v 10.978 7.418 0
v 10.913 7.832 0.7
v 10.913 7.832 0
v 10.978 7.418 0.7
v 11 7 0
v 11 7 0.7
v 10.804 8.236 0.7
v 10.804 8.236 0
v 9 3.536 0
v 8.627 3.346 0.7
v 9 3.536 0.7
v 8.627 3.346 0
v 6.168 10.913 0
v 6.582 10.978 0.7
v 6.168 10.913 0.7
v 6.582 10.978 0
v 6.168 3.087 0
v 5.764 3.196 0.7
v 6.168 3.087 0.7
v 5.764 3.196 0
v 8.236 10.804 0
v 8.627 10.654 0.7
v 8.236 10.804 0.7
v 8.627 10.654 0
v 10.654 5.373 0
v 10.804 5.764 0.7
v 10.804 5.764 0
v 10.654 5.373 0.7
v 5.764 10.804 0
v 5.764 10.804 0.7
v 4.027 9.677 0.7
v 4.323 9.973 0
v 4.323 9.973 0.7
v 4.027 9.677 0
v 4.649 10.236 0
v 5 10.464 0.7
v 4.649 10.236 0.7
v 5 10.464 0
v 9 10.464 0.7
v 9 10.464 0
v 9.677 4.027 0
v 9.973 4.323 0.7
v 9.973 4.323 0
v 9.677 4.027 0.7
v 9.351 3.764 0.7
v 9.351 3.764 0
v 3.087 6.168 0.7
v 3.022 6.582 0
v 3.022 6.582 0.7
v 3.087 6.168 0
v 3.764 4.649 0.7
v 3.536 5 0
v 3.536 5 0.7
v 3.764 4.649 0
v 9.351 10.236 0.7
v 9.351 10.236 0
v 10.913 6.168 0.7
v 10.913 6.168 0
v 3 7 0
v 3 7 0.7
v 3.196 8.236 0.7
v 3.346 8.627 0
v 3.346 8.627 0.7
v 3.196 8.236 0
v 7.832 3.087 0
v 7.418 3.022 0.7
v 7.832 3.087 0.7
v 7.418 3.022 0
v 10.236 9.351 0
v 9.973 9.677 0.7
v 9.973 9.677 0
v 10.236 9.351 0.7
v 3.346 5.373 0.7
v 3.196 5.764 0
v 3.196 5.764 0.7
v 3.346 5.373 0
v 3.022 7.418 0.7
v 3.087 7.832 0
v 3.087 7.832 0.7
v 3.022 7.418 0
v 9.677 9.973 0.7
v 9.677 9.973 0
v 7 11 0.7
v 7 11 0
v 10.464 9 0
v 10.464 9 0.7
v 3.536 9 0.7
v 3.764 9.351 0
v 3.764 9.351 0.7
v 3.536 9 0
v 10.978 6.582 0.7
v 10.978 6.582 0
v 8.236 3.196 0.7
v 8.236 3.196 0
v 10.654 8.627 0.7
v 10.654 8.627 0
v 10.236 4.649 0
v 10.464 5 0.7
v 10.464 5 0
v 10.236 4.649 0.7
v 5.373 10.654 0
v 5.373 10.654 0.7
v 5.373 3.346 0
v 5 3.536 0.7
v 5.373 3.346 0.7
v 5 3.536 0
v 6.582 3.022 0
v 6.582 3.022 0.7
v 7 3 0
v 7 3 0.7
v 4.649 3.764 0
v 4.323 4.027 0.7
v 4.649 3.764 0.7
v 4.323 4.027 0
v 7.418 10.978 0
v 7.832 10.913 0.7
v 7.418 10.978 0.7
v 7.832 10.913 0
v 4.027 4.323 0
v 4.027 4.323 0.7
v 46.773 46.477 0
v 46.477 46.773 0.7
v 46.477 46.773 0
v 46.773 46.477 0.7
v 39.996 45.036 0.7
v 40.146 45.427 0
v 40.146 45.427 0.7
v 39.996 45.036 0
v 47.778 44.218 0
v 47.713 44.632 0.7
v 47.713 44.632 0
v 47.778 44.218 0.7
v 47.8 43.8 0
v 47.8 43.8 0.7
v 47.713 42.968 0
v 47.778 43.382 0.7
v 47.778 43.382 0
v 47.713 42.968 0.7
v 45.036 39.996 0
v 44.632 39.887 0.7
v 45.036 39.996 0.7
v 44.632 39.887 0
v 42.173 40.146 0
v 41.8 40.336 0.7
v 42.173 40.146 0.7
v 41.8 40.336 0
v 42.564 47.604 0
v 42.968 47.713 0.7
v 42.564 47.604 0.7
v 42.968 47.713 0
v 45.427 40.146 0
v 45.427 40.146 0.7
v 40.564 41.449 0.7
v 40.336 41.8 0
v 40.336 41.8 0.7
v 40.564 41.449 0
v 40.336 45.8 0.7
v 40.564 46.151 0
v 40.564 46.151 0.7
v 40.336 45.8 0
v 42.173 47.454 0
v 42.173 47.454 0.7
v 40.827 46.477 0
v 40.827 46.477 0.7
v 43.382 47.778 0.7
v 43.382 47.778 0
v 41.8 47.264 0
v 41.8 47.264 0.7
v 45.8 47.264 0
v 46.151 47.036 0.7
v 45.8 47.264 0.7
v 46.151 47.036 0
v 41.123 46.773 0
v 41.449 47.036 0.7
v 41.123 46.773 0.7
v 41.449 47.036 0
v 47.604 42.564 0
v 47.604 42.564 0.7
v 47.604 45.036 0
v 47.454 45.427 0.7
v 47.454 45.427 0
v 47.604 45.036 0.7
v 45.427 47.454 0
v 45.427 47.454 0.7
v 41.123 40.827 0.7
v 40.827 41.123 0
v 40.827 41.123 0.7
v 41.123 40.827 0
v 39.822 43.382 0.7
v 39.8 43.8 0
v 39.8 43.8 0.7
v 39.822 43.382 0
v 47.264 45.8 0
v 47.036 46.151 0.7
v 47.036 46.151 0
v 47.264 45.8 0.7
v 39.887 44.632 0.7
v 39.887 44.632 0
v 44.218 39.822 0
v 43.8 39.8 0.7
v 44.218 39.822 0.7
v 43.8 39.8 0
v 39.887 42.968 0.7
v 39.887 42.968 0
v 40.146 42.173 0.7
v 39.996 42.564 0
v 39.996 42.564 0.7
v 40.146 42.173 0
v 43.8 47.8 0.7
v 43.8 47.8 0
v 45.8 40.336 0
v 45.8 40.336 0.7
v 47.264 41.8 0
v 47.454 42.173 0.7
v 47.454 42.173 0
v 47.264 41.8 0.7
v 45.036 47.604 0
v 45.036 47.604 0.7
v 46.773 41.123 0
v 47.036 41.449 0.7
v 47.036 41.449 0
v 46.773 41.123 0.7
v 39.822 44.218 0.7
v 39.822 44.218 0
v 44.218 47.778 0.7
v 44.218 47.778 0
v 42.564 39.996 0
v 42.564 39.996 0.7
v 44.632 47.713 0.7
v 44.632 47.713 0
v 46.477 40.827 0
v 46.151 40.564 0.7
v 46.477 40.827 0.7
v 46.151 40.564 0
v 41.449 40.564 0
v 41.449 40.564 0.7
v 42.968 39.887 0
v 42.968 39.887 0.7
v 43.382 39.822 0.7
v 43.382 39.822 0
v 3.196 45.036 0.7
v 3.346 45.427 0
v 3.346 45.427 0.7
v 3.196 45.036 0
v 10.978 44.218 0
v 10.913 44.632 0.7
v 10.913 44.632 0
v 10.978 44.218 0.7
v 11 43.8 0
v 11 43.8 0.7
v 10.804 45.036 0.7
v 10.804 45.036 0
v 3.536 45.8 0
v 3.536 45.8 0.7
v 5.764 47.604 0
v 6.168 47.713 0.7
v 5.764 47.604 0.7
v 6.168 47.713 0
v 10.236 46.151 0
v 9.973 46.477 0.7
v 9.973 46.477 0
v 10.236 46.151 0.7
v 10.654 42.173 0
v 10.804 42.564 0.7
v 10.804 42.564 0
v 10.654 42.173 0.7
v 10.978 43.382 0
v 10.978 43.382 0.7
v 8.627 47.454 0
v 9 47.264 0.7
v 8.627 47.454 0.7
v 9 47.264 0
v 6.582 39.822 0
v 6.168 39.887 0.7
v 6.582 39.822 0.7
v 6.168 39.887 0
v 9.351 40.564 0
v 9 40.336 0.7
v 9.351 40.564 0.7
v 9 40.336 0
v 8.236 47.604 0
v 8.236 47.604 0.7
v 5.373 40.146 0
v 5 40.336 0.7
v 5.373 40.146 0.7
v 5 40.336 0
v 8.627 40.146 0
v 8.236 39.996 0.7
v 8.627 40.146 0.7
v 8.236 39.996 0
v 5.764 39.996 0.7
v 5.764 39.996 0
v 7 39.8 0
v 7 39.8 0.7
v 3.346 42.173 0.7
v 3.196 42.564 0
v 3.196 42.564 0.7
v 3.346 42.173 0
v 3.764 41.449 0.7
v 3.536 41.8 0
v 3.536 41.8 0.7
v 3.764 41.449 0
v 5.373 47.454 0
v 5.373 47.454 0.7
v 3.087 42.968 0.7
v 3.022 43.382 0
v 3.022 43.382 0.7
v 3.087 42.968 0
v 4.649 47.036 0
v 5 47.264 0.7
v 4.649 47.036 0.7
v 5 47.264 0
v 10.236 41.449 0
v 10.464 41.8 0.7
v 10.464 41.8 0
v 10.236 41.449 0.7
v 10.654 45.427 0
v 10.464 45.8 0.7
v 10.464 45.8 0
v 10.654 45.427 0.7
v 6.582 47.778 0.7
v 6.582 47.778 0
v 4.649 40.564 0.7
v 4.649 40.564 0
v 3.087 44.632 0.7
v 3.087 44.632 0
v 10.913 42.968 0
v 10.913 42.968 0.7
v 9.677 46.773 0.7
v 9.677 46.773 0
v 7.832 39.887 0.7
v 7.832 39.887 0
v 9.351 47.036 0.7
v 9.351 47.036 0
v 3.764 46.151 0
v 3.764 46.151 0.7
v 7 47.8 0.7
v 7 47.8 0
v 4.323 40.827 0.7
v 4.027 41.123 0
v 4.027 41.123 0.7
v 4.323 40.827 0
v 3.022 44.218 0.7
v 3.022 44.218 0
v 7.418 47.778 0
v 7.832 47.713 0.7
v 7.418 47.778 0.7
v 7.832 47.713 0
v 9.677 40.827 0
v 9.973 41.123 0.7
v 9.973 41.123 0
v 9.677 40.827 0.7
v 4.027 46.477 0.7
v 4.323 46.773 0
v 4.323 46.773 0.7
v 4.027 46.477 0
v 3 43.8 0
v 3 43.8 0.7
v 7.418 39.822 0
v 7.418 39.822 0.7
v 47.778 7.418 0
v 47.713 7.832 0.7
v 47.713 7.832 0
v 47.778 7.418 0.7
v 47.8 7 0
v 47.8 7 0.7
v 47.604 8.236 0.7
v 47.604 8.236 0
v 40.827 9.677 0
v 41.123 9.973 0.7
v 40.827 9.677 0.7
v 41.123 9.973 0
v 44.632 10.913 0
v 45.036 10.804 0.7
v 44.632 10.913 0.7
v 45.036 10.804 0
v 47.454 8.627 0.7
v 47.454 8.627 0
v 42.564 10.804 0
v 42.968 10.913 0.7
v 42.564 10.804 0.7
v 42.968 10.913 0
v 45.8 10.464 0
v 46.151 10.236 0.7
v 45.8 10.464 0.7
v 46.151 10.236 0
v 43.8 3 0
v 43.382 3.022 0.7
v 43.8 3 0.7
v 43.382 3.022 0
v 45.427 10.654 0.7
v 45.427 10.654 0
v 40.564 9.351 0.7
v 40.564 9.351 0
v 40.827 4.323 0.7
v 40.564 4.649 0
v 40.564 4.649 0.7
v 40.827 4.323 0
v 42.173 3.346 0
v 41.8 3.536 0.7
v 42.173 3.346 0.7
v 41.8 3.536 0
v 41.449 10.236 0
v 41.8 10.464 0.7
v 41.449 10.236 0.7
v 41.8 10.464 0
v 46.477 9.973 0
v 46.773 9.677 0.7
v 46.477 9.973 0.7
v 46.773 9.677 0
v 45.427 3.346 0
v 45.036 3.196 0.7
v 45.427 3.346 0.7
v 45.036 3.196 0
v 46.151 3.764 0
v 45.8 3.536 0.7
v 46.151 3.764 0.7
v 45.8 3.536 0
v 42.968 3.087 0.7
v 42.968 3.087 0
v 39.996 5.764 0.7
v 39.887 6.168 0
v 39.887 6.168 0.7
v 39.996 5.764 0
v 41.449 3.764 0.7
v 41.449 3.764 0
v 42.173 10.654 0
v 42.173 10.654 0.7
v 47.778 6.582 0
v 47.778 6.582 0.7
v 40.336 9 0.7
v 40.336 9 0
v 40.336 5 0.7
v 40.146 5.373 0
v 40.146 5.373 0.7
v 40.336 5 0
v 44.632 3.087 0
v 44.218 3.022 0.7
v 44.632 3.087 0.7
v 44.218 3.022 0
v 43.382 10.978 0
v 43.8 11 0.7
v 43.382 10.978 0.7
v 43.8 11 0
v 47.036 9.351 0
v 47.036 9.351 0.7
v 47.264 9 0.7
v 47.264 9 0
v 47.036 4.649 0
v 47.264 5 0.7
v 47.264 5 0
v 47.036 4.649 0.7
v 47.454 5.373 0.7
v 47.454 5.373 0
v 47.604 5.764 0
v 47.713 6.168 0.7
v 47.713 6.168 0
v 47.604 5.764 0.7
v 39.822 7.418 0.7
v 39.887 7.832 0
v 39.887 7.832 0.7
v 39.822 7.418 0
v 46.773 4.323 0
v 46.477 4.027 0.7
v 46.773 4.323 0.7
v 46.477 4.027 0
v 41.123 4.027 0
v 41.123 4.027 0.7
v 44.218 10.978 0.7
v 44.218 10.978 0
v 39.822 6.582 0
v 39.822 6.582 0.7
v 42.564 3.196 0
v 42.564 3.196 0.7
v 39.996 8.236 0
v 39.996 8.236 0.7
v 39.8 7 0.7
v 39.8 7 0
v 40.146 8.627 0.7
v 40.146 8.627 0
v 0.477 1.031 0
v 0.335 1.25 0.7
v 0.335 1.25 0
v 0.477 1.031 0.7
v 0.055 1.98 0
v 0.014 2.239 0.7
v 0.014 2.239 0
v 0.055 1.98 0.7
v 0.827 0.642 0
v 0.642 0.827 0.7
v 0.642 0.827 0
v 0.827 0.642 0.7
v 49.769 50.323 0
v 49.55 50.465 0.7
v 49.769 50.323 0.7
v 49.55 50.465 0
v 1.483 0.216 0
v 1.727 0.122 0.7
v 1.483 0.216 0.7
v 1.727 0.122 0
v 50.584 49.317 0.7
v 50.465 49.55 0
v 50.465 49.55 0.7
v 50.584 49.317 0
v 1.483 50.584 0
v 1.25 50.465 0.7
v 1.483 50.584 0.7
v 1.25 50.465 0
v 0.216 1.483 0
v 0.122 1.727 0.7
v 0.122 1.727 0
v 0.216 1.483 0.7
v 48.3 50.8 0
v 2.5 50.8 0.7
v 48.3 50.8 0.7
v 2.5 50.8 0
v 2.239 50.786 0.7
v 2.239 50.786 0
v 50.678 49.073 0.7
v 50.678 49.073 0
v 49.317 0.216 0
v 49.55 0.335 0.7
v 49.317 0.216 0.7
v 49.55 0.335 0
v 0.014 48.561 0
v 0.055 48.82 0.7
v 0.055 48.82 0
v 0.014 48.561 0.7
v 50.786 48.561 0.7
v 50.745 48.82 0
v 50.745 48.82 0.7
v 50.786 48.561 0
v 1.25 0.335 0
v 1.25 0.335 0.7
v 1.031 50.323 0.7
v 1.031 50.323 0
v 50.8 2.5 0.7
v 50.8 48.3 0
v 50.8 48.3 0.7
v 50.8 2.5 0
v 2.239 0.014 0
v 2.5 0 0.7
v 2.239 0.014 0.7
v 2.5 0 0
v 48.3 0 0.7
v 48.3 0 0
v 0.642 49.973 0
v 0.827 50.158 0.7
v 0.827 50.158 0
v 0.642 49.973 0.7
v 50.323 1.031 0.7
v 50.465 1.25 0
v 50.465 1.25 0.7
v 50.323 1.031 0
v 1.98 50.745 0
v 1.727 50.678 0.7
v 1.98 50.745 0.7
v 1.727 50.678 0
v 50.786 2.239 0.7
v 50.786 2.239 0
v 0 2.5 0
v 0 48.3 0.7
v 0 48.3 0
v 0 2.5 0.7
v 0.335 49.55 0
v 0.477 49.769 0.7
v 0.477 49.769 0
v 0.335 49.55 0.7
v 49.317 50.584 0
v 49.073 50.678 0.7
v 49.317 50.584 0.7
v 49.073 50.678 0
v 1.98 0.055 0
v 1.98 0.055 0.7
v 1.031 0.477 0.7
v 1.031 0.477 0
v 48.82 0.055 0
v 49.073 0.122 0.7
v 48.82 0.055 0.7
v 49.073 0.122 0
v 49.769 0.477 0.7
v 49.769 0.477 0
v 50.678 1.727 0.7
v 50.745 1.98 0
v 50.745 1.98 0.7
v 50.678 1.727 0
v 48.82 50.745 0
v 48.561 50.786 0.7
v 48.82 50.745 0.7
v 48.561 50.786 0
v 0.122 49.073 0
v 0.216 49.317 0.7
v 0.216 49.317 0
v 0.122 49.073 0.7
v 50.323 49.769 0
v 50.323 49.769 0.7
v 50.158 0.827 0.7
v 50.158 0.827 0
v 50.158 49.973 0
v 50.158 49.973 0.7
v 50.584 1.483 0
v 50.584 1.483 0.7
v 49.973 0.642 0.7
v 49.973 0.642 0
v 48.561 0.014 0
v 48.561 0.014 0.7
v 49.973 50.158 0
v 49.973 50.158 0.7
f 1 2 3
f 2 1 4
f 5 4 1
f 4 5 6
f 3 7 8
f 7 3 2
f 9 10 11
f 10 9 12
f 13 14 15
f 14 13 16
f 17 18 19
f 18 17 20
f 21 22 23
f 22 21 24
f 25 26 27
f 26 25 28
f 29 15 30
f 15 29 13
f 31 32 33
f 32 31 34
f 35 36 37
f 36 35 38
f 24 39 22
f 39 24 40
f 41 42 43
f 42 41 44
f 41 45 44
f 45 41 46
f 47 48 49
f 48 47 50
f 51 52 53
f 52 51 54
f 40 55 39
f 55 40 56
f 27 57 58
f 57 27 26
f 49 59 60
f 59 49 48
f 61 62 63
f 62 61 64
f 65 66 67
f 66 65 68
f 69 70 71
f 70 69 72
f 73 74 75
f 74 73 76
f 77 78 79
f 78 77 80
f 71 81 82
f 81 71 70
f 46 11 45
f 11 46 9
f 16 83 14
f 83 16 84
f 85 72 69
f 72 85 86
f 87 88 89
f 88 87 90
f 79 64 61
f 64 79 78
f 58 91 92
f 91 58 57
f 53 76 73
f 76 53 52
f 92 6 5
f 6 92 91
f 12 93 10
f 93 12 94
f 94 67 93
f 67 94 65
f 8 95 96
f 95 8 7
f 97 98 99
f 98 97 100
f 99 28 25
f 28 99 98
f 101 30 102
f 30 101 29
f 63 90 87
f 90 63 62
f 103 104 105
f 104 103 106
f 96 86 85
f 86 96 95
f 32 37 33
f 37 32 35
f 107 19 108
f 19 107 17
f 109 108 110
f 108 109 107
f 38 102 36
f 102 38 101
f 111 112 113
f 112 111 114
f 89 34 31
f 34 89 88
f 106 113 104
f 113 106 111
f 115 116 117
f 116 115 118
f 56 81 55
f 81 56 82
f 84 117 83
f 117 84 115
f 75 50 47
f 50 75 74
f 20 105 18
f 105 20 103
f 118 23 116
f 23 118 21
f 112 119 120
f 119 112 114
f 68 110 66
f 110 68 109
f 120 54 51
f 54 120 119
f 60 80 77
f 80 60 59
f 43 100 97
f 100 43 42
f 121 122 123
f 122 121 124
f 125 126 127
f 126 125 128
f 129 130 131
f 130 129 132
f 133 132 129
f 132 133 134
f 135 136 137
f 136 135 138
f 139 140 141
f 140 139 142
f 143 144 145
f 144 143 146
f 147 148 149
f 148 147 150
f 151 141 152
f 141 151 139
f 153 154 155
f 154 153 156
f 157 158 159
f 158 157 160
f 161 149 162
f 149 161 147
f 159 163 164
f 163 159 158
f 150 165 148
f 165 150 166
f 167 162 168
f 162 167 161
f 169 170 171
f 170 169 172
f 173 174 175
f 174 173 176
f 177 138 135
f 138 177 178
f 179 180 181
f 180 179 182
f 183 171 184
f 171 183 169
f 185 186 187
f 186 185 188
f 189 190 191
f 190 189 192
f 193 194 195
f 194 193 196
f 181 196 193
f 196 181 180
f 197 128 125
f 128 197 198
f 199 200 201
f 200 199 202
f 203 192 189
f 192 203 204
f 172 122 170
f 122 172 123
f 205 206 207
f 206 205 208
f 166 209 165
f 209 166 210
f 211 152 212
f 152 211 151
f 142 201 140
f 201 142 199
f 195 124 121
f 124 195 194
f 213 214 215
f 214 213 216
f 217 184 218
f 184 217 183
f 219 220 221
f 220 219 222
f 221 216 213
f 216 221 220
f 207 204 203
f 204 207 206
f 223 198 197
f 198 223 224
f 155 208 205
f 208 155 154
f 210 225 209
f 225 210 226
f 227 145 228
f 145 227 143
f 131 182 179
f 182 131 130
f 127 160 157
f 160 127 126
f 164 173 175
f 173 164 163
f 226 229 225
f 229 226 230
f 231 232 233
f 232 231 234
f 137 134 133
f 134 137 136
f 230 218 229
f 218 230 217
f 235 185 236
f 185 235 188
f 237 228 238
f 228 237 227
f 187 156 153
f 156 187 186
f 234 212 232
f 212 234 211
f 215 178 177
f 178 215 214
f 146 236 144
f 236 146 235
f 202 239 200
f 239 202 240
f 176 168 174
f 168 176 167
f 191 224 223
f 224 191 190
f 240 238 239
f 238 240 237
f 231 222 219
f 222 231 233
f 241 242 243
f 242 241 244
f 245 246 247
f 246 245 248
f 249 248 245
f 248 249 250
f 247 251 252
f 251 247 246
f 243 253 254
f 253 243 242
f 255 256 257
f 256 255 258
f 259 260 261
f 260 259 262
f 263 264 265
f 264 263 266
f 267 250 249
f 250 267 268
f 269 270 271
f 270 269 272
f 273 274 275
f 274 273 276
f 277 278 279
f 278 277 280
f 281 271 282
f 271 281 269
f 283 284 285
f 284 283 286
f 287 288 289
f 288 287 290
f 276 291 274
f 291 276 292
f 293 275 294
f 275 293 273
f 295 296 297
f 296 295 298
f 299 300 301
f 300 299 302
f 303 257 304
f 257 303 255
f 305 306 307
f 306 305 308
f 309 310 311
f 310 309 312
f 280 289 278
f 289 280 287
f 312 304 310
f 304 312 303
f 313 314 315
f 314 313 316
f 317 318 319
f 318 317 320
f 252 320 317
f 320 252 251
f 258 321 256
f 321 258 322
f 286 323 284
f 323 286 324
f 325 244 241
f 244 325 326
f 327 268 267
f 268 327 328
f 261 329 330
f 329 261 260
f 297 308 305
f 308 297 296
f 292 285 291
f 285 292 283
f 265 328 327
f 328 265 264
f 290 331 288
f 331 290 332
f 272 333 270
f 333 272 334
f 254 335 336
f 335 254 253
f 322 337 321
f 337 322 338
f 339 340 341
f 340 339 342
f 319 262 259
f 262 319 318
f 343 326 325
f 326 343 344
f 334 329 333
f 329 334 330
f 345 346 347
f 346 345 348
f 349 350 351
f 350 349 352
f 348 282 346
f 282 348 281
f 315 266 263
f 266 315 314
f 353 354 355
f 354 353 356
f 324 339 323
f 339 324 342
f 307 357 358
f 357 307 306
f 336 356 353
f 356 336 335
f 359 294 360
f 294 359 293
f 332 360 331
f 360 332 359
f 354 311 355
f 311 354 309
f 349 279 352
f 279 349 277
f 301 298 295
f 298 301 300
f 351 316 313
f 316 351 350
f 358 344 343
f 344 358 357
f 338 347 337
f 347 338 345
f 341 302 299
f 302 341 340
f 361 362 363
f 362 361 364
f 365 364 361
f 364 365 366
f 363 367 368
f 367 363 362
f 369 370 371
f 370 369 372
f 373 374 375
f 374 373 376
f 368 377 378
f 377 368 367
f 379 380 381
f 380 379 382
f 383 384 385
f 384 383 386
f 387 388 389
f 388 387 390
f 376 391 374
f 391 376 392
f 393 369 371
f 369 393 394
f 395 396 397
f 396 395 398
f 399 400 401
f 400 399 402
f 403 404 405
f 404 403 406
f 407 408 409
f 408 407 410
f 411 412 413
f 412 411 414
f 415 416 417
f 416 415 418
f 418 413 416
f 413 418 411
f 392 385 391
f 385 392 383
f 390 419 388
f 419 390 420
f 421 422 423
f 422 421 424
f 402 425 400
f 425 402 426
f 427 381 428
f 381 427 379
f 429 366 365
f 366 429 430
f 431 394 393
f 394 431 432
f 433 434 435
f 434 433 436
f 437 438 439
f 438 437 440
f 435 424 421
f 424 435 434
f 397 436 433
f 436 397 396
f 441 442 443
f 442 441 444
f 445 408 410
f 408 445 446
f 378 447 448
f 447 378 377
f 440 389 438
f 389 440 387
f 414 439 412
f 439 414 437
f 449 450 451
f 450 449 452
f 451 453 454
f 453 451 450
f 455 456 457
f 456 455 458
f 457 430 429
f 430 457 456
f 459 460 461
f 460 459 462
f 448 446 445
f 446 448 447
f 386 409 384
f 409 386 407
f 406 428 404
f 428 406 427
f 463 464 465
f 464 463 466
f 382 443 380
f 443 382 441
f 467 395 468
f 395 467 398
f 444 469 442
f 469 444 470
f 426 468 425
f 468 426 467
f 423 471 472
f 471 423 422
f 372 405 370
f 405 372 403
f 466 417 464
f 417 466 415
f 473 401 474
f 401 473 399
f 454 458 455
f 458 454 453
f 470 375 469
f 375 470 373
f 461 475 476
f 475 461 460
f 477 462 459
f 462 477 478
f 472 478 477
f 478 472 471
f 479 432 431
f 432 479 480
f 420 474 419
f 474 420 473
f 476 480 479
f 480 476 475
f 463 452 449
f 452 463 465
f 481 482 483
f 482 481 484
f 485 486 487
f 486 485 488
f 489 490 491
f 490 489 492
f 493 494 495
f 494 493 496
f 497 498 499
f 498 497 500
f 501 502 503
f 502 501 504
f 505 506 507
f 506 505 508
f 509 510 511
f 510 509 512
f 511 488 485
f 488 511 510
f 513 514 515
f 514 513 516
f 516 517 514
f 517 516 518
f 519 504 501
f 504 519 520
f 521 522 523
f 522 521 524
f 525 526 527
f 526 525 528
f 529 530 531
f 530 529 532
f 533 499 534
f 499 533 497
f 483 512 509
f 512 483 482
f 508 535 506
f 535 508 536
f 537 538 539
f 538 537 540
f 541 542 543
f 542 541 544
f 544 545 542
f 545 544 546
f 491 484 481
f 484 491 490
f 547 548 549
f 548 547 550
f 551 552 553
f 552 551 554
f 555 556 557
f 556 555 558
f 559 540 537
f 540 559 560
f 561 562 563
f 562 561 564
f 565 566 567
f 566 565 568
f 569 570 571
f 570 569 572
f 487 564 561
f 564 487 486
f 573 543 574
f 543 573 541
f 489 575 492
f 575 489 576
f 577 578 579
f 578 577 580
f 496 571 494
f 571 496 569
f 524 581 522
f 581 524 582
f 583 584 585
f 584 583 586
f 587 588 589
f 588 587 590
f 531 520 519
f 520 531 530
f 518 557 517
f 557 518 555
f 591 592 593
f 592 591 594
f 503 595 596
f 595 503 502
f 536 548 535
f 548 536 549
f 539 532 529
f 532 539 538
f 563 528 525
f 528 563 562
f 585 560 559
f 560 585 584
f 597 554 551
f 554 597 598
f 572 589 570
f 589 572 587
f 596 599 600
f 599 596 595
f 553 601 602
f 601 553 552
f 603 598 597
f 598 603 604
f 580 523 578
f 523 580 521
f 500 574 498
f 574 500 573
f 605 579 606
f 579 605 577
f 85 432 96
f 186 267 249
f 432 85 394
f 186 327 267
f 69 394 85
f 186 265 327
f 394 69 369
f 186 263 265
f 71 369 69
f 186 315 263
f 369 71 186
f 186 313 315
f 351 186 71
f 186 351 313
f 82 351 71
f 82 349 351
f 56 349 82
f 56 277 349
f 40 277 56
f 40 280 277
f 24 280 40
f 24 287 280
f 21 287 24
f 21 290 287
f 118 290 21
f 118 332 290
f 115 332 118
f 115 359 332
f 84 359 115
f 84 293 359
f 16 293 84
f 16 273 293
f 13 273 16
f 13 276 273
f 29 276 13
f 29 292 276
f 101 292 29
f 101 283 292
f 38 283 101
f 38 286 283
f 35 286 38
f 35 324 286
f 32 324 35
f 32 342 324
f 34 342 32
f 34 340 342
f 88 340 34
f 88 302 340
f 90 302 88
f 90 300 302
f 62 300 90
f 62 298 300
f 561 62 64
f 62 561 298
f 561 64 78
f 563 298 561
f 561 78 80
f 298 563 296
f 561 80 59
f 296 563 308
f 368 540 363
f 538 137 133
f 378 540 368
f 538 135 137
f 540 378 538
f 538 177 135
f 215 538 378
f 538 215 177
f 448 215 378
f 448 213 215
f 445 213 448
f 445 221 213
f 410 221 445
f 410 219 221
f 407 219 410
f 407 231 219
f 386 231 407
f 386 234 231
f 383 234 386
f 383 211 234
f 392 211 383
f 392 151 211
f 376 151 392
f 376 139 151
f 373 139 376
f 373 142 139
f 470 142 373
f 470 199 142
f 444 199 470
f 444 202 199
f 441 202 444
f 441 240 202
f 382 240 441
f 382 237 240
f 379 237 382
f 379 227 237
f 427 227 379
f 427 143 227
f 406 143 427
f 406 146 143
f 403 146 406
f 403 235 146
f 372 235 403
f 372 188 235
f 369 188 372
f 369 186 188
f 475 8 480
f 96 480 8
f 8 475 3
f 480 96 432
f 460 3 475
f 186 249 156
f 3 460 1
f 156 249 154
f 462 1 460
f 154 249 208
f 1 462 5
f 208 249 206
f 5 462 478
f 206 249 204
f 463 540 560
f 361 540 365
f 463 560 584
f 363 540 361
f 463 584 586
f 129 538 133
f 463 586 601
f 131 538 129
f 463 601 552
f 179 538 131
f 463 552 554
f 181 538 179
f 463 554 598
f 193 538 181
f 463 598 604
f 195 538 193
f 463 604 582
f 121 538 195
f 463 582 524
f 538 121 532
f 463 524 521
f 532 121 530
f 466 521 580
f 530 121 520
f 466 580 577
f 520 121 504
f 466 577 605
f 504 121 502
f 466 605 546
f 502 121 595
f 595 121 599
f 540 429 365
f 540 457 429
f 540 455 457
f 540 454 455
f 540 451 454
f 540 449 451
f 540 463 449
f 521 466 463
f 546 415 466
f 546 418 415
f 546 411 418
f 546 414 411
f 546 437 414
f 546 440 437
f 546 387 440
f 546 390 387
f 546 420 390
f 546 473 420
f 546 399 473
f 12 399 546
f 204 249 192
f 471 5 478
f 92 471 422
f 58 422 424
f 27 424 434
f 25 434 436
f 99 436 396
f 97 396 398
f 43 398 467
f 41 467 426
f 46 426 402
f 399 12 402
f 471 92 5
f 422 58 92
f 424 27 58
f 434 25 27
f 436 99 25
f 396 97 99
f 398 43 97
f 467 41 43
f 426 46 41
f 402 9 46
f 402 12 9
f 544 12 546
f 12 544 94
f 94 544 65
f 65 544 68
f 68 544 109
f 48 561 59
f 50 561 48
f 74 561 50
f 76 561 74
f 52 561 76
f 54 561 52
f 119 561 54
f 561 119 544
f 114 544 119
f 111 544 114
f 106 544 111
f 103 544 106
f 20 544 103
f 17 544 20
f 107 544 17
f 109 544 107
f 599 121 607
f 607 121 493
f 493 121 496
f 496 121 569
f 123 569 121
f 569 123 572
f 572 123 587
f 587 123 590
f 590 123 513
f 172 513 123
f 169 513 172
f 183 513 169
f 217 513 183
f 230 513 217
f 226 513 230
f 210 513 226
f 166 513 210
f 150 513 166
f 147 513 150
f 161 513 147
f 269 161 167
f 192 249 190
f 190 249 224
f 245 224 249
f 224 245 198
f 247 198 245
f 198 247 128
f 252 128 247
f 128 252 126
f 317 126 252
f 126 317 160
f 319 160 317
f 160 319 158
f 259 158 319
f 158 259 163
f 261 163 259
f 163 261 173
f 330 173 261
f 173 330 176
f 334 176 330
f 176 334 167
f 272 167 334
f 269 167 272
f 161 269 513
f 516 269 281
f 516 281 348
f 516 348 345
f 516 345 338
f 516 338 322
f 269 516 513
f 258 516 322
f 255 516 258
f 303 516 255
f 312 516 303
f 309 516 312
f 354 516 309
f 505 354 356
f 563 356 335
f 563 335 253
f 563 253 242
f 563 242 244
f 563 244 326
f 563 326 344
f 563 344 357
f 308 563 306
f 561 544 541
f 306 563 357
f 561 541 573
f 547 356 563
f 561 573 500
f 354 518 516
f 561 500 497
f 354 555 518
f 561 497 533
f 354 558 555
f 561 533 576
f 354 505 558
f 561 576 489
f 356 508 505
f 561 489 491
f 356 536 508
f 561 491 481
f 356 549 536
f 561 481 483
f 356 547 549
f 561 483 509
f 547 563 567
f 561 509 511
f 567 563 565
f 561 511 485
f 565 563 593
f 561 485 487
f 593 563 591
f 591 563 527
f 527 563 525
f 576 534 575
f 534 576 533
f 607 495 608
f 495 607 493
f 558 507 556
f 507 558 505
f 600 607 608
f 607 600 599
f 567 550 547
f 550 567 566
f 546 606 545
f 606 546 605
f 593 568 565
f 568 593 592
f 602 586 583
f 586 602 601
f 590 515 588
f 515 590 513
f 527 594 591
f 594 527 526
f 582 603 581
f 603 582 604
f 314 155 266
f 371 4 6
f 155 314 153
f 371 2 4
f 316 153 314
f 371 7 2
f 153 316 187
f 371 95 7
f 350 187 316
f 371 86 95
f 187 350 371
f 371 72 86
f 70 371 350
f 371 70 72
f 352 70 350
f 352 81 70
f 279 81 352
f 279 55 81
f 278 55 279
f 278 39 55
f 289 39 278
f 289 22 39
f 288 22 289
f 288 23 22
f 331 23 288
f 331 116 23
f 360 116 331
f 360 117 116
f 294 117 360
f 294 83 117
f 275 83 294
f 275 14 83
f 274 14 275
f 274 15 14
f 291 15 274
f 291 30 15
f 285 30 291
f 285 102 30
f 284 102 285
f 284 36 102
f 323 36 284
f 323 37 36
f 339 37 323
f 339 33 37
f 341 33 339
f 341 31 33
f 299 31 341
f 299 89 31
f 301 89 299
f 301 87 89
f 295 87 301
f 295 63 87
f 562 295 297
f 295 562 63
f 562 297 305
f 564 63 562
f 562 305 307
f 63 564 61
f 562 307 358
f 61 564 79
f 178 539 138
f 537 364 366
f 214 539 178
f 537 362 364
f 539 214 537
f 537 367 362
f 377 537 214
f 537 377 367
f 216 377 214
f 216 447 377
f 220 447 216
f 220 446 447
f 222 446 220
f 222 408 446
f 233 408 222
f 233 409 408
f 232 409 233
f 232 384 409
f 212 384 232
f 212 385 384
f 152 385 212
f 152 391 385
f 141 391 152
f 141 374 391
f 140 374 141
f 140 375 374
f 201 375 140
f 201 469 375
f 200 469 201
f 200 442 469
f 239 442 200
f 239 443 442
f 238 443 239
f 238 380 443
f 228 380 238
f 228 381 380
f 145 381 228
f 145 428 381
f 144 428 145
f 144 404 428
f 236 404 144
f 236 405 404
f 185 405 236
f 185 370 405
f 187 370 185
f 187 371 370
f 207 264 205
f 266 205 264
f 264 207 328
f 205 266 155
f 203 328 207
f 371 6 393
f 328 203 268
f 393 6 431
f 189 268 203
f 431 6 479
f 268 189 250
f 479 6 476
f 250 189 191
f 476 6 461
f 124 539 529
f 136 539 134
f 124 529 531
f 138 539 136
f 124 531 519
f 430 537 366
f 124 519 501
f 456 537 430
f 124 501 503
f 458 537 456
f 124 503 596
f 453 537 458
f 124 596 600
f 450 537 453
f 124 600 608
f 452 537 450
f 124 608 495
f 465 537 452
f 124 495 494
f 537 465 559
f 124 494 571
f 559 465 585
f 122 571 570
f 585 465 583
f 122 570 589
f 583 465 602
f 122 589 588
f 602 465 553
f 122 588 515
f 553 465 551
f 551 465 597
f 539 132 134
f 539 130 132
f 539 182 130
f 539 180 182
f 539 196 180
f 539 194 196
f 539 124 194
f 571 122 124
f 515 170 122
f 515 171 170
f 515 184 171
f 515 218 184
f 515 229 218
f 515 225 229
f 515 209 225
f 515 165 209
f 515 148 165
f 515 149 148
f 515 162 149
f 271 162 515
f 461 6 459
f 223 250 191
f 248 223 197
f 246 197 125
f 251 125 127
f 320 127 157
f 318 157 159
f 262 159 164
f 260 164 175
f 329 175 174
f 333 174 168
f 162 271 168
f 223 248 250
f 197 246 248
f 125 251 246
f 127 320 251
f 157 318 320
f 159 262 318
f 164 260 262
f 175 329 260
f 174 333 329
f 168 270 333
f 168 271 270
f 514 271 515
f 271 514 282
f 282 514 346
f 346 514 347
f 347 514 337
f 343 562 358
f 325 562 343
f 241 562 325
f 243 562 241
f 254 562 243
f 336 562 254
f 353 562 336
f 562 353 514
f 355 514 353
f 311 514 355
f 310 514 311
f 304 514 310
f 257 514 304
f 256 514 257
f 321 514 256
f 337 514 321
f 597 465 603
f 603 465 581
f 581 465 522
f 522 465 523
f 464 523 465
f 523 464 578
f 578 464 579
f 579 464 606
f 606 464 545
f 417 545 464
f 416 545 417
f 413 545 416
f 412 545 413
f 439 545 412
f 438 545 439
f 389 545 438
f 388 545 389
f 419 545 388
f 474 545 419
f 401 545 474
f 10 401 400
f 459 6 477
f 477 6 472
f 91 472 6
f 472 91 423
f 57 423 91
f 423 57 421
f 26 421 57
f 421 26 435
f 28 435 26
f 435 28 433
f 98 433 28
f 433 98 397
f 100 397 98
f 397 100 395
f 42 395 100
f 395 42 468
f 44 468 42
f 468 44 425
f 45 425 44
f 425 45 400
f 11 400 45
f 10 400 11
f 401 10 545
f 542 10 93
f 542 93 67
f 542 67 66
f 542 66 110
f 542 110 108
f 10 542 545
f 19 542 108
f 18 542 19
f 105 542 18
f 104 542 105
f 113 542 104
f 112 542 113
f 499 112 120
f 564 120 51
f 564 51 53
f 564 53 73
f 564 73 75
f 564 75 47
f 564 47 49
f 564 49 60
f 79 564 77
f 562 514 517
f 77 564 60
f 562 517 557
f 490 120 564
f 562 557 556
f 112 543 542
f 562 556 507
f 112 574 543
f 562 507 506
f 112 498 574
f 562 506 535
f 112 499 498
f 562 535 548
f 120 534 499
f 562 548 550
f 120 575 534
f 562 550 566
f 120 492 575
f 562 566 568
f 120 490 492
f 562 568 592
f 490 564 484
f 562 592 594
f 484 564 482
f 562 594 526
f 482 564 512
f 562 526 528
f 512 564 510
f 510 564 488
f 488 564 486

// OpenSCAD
//the edge to edge diameter of the card. 50.8 mm = 2 inches.
diameter = 50.8; 
// how far in the holes are from the corners of the card.
inset=7; 
// how thick the cards are. Ideally a multiple or your layer height.
thickness =.7;
//the diameter of the of the corner.  
cornerDiameter =5;
// the diameter of the holes.
holeDiameter=8;
$fn=60;


difference()
{
	translate([cornerDiameter/2,cornerDiameter/2,0])render()
	{
		minkowski()
		{
			cube([diameter-cornerDiameter,diameter-cornerDiameter,thickness/2]);
			cylinder(thickness/2,d=cornerDiameter);
		}
	}
	translate([0,0,0])
		{
			translate([inset,inset,-.1])cylinder(d=holeDiameter,thickness*2);
			translate([diameter-inset,diameter-inset,0-.1])cylinder(d=holeDiameter,thickness*2);
			translate([inset,diameter-inset,-.1])cylinder(d=holeDiameter,thickness*2);
			translate([diameter-inset,inset,-.1])cylinder(d=holeDiameter,thickness*2);
		}
}
